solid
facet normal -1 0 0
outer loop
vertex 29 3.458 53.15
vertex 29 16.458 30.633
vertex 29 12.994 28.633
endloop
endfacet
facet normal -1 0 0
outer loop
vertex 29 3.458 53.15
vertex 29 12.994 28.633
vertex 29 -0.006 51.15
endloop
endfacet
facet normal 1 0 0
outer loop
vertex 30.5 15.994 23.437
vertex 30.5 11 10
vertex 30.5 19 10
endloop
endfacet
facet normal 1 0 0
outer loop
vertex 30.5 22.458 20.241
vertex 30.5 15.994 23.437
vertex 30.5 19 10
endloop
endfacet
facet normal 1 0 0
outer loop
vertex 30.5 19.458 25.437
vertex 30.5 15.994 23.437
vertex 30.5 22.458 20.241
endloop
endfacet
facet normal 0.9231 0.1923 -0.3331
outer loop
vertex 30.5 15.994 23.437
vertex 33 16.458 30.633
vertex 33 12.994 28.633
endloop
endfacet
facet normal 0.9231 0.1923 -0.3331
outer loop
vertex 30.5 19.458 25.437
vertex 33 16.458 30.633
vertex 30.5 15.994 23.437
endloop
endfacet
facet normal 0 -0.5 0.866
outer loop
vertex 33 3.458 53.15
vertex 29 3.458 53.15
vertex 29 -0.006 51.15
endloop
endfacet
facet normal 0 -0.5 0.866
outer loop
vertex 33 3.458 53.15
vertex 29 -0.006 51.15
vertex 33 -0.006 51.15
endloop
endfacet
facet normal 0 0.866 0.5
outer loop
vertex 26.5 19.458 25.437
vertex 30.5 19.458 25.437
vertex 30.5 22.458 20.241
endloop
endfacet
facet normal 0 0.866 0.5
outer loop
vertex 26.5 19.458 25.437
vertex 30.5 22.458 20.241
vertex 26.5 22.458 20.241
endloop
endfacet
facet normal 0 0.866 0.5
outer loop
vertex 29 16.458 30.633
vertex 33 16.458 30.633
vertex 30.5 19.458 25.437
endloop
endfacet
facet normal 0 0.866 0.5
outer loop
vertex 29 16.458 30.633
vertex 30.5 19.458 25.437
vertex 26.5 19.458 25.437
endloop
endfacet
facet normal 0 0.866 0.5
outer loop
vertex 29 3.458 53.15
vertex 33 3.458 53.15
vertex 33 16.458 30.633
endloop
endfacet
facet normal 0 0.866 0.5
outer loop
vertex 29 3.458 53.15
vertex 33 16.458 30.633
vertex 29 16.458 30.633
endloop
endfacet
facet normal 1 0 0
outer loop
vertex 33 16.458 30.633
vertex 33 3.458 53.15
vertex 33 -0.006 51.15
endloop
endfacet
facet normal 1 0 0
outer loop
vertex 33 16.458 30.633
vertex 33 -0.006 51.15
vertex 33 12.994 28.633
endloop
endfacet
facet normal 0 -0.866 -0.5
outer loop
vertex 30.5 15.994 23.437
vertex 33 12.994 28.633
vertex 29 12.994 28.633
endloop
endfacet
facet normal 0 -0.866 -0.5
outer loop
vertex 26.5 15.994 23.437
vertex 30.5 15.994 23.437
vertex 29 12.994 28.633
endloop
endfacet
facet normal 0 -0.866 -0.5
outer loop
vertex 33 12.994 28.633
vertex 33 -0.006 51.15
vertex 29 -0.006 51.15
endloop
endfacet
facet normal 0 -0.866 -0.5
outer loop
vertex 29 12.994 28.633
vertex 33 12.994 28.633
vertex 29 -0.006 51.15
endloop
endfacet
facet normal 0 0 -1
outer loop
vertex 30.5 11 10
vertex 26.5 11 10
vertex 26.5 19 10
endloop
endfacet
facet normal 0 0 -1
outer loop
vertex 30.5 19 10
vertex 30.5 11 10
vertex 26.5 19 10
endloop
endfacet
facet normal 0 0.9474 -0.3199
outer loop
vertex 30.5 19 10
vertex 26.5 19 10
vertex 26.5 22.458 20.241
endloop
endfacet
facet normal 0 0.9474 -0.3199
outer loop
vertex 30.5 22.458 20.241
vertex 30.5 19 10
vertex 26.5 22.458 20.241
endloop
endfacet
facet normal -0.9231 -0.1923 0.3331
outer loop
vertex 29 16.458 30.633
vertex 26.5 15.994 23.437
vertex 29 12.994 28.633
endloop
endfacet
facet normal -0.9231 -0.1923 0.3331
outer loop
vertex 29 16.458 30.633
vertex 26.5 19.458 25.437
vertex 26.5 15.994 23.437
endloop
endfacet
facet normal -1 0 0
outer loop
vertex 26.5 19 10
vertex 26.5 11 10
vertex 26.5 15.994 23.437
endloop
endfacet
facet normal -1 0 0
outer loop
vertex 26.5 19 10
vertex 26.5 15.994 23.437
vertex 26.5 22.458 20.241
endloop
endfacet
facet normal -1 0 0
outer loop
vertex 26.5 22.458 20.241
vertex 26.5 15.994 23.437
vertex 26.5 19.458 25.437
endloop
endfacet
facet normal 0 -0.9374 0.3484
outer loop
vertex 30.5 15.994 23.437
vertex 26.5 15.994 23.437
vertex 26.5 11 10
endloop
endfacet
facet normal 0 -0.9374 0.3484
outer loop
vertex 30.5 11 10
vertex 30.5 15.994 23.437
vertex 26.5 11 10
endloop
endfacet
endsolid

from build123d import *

# Parameters (mm, degrees)
EXTRUDE023_DEPTH                          = 4
EXTRUDE022_DEPTH                          = 4
EXTRUDE022_ONTO_SKETCH021_PLACEMENT_ANGLE = 120


with BuildPart() as extrude023:
    # Sketch022 (on Face6 of Extrude022) → Extrude023 (new body)
    with BuildSketch(Plane(origin=(26.5, 0, 0), x_dir=(0, -1, 0), z_dir=(-1, 0, 0))):
        Polygon((-15.99404, 23.43698), (-11, 10), (-19, 10), (-22.458142, 20.240827), align=None)
    extrude(amount=-EXTRUDE023_DEPTH)


with BuildPart() as pin_boot:
    # Sketch021 as drawn → Extrude022 (new)
    with BuildSketch(Plane.XY):
        Polygon((29, 44.3), (33, 44.3), (33, 18.3), (30.5, 12.3), (30.5, 6.3), (26.5, 6.3), (26.5, 12.3), (29, 18.3), align=None)
    extrude(amount=EXTRUDE022_DEPTH)


with BuildPart() as pin_boot_1:
    # Extrude022 onto Sketch021 placement: moved
    add(pin_boot.part.moved(Location((0, 25.608142, 14.784867))).rotate(Axis((0, 25.608142, 14.784867), (1, 0, 0)), EXTRUDE022_ONTO_SKETCH021_PLACEMENT_ANGLE))

    # Connect005: union Extrude023
    add(extrude023.part)


solid = pin_boot_1.part
